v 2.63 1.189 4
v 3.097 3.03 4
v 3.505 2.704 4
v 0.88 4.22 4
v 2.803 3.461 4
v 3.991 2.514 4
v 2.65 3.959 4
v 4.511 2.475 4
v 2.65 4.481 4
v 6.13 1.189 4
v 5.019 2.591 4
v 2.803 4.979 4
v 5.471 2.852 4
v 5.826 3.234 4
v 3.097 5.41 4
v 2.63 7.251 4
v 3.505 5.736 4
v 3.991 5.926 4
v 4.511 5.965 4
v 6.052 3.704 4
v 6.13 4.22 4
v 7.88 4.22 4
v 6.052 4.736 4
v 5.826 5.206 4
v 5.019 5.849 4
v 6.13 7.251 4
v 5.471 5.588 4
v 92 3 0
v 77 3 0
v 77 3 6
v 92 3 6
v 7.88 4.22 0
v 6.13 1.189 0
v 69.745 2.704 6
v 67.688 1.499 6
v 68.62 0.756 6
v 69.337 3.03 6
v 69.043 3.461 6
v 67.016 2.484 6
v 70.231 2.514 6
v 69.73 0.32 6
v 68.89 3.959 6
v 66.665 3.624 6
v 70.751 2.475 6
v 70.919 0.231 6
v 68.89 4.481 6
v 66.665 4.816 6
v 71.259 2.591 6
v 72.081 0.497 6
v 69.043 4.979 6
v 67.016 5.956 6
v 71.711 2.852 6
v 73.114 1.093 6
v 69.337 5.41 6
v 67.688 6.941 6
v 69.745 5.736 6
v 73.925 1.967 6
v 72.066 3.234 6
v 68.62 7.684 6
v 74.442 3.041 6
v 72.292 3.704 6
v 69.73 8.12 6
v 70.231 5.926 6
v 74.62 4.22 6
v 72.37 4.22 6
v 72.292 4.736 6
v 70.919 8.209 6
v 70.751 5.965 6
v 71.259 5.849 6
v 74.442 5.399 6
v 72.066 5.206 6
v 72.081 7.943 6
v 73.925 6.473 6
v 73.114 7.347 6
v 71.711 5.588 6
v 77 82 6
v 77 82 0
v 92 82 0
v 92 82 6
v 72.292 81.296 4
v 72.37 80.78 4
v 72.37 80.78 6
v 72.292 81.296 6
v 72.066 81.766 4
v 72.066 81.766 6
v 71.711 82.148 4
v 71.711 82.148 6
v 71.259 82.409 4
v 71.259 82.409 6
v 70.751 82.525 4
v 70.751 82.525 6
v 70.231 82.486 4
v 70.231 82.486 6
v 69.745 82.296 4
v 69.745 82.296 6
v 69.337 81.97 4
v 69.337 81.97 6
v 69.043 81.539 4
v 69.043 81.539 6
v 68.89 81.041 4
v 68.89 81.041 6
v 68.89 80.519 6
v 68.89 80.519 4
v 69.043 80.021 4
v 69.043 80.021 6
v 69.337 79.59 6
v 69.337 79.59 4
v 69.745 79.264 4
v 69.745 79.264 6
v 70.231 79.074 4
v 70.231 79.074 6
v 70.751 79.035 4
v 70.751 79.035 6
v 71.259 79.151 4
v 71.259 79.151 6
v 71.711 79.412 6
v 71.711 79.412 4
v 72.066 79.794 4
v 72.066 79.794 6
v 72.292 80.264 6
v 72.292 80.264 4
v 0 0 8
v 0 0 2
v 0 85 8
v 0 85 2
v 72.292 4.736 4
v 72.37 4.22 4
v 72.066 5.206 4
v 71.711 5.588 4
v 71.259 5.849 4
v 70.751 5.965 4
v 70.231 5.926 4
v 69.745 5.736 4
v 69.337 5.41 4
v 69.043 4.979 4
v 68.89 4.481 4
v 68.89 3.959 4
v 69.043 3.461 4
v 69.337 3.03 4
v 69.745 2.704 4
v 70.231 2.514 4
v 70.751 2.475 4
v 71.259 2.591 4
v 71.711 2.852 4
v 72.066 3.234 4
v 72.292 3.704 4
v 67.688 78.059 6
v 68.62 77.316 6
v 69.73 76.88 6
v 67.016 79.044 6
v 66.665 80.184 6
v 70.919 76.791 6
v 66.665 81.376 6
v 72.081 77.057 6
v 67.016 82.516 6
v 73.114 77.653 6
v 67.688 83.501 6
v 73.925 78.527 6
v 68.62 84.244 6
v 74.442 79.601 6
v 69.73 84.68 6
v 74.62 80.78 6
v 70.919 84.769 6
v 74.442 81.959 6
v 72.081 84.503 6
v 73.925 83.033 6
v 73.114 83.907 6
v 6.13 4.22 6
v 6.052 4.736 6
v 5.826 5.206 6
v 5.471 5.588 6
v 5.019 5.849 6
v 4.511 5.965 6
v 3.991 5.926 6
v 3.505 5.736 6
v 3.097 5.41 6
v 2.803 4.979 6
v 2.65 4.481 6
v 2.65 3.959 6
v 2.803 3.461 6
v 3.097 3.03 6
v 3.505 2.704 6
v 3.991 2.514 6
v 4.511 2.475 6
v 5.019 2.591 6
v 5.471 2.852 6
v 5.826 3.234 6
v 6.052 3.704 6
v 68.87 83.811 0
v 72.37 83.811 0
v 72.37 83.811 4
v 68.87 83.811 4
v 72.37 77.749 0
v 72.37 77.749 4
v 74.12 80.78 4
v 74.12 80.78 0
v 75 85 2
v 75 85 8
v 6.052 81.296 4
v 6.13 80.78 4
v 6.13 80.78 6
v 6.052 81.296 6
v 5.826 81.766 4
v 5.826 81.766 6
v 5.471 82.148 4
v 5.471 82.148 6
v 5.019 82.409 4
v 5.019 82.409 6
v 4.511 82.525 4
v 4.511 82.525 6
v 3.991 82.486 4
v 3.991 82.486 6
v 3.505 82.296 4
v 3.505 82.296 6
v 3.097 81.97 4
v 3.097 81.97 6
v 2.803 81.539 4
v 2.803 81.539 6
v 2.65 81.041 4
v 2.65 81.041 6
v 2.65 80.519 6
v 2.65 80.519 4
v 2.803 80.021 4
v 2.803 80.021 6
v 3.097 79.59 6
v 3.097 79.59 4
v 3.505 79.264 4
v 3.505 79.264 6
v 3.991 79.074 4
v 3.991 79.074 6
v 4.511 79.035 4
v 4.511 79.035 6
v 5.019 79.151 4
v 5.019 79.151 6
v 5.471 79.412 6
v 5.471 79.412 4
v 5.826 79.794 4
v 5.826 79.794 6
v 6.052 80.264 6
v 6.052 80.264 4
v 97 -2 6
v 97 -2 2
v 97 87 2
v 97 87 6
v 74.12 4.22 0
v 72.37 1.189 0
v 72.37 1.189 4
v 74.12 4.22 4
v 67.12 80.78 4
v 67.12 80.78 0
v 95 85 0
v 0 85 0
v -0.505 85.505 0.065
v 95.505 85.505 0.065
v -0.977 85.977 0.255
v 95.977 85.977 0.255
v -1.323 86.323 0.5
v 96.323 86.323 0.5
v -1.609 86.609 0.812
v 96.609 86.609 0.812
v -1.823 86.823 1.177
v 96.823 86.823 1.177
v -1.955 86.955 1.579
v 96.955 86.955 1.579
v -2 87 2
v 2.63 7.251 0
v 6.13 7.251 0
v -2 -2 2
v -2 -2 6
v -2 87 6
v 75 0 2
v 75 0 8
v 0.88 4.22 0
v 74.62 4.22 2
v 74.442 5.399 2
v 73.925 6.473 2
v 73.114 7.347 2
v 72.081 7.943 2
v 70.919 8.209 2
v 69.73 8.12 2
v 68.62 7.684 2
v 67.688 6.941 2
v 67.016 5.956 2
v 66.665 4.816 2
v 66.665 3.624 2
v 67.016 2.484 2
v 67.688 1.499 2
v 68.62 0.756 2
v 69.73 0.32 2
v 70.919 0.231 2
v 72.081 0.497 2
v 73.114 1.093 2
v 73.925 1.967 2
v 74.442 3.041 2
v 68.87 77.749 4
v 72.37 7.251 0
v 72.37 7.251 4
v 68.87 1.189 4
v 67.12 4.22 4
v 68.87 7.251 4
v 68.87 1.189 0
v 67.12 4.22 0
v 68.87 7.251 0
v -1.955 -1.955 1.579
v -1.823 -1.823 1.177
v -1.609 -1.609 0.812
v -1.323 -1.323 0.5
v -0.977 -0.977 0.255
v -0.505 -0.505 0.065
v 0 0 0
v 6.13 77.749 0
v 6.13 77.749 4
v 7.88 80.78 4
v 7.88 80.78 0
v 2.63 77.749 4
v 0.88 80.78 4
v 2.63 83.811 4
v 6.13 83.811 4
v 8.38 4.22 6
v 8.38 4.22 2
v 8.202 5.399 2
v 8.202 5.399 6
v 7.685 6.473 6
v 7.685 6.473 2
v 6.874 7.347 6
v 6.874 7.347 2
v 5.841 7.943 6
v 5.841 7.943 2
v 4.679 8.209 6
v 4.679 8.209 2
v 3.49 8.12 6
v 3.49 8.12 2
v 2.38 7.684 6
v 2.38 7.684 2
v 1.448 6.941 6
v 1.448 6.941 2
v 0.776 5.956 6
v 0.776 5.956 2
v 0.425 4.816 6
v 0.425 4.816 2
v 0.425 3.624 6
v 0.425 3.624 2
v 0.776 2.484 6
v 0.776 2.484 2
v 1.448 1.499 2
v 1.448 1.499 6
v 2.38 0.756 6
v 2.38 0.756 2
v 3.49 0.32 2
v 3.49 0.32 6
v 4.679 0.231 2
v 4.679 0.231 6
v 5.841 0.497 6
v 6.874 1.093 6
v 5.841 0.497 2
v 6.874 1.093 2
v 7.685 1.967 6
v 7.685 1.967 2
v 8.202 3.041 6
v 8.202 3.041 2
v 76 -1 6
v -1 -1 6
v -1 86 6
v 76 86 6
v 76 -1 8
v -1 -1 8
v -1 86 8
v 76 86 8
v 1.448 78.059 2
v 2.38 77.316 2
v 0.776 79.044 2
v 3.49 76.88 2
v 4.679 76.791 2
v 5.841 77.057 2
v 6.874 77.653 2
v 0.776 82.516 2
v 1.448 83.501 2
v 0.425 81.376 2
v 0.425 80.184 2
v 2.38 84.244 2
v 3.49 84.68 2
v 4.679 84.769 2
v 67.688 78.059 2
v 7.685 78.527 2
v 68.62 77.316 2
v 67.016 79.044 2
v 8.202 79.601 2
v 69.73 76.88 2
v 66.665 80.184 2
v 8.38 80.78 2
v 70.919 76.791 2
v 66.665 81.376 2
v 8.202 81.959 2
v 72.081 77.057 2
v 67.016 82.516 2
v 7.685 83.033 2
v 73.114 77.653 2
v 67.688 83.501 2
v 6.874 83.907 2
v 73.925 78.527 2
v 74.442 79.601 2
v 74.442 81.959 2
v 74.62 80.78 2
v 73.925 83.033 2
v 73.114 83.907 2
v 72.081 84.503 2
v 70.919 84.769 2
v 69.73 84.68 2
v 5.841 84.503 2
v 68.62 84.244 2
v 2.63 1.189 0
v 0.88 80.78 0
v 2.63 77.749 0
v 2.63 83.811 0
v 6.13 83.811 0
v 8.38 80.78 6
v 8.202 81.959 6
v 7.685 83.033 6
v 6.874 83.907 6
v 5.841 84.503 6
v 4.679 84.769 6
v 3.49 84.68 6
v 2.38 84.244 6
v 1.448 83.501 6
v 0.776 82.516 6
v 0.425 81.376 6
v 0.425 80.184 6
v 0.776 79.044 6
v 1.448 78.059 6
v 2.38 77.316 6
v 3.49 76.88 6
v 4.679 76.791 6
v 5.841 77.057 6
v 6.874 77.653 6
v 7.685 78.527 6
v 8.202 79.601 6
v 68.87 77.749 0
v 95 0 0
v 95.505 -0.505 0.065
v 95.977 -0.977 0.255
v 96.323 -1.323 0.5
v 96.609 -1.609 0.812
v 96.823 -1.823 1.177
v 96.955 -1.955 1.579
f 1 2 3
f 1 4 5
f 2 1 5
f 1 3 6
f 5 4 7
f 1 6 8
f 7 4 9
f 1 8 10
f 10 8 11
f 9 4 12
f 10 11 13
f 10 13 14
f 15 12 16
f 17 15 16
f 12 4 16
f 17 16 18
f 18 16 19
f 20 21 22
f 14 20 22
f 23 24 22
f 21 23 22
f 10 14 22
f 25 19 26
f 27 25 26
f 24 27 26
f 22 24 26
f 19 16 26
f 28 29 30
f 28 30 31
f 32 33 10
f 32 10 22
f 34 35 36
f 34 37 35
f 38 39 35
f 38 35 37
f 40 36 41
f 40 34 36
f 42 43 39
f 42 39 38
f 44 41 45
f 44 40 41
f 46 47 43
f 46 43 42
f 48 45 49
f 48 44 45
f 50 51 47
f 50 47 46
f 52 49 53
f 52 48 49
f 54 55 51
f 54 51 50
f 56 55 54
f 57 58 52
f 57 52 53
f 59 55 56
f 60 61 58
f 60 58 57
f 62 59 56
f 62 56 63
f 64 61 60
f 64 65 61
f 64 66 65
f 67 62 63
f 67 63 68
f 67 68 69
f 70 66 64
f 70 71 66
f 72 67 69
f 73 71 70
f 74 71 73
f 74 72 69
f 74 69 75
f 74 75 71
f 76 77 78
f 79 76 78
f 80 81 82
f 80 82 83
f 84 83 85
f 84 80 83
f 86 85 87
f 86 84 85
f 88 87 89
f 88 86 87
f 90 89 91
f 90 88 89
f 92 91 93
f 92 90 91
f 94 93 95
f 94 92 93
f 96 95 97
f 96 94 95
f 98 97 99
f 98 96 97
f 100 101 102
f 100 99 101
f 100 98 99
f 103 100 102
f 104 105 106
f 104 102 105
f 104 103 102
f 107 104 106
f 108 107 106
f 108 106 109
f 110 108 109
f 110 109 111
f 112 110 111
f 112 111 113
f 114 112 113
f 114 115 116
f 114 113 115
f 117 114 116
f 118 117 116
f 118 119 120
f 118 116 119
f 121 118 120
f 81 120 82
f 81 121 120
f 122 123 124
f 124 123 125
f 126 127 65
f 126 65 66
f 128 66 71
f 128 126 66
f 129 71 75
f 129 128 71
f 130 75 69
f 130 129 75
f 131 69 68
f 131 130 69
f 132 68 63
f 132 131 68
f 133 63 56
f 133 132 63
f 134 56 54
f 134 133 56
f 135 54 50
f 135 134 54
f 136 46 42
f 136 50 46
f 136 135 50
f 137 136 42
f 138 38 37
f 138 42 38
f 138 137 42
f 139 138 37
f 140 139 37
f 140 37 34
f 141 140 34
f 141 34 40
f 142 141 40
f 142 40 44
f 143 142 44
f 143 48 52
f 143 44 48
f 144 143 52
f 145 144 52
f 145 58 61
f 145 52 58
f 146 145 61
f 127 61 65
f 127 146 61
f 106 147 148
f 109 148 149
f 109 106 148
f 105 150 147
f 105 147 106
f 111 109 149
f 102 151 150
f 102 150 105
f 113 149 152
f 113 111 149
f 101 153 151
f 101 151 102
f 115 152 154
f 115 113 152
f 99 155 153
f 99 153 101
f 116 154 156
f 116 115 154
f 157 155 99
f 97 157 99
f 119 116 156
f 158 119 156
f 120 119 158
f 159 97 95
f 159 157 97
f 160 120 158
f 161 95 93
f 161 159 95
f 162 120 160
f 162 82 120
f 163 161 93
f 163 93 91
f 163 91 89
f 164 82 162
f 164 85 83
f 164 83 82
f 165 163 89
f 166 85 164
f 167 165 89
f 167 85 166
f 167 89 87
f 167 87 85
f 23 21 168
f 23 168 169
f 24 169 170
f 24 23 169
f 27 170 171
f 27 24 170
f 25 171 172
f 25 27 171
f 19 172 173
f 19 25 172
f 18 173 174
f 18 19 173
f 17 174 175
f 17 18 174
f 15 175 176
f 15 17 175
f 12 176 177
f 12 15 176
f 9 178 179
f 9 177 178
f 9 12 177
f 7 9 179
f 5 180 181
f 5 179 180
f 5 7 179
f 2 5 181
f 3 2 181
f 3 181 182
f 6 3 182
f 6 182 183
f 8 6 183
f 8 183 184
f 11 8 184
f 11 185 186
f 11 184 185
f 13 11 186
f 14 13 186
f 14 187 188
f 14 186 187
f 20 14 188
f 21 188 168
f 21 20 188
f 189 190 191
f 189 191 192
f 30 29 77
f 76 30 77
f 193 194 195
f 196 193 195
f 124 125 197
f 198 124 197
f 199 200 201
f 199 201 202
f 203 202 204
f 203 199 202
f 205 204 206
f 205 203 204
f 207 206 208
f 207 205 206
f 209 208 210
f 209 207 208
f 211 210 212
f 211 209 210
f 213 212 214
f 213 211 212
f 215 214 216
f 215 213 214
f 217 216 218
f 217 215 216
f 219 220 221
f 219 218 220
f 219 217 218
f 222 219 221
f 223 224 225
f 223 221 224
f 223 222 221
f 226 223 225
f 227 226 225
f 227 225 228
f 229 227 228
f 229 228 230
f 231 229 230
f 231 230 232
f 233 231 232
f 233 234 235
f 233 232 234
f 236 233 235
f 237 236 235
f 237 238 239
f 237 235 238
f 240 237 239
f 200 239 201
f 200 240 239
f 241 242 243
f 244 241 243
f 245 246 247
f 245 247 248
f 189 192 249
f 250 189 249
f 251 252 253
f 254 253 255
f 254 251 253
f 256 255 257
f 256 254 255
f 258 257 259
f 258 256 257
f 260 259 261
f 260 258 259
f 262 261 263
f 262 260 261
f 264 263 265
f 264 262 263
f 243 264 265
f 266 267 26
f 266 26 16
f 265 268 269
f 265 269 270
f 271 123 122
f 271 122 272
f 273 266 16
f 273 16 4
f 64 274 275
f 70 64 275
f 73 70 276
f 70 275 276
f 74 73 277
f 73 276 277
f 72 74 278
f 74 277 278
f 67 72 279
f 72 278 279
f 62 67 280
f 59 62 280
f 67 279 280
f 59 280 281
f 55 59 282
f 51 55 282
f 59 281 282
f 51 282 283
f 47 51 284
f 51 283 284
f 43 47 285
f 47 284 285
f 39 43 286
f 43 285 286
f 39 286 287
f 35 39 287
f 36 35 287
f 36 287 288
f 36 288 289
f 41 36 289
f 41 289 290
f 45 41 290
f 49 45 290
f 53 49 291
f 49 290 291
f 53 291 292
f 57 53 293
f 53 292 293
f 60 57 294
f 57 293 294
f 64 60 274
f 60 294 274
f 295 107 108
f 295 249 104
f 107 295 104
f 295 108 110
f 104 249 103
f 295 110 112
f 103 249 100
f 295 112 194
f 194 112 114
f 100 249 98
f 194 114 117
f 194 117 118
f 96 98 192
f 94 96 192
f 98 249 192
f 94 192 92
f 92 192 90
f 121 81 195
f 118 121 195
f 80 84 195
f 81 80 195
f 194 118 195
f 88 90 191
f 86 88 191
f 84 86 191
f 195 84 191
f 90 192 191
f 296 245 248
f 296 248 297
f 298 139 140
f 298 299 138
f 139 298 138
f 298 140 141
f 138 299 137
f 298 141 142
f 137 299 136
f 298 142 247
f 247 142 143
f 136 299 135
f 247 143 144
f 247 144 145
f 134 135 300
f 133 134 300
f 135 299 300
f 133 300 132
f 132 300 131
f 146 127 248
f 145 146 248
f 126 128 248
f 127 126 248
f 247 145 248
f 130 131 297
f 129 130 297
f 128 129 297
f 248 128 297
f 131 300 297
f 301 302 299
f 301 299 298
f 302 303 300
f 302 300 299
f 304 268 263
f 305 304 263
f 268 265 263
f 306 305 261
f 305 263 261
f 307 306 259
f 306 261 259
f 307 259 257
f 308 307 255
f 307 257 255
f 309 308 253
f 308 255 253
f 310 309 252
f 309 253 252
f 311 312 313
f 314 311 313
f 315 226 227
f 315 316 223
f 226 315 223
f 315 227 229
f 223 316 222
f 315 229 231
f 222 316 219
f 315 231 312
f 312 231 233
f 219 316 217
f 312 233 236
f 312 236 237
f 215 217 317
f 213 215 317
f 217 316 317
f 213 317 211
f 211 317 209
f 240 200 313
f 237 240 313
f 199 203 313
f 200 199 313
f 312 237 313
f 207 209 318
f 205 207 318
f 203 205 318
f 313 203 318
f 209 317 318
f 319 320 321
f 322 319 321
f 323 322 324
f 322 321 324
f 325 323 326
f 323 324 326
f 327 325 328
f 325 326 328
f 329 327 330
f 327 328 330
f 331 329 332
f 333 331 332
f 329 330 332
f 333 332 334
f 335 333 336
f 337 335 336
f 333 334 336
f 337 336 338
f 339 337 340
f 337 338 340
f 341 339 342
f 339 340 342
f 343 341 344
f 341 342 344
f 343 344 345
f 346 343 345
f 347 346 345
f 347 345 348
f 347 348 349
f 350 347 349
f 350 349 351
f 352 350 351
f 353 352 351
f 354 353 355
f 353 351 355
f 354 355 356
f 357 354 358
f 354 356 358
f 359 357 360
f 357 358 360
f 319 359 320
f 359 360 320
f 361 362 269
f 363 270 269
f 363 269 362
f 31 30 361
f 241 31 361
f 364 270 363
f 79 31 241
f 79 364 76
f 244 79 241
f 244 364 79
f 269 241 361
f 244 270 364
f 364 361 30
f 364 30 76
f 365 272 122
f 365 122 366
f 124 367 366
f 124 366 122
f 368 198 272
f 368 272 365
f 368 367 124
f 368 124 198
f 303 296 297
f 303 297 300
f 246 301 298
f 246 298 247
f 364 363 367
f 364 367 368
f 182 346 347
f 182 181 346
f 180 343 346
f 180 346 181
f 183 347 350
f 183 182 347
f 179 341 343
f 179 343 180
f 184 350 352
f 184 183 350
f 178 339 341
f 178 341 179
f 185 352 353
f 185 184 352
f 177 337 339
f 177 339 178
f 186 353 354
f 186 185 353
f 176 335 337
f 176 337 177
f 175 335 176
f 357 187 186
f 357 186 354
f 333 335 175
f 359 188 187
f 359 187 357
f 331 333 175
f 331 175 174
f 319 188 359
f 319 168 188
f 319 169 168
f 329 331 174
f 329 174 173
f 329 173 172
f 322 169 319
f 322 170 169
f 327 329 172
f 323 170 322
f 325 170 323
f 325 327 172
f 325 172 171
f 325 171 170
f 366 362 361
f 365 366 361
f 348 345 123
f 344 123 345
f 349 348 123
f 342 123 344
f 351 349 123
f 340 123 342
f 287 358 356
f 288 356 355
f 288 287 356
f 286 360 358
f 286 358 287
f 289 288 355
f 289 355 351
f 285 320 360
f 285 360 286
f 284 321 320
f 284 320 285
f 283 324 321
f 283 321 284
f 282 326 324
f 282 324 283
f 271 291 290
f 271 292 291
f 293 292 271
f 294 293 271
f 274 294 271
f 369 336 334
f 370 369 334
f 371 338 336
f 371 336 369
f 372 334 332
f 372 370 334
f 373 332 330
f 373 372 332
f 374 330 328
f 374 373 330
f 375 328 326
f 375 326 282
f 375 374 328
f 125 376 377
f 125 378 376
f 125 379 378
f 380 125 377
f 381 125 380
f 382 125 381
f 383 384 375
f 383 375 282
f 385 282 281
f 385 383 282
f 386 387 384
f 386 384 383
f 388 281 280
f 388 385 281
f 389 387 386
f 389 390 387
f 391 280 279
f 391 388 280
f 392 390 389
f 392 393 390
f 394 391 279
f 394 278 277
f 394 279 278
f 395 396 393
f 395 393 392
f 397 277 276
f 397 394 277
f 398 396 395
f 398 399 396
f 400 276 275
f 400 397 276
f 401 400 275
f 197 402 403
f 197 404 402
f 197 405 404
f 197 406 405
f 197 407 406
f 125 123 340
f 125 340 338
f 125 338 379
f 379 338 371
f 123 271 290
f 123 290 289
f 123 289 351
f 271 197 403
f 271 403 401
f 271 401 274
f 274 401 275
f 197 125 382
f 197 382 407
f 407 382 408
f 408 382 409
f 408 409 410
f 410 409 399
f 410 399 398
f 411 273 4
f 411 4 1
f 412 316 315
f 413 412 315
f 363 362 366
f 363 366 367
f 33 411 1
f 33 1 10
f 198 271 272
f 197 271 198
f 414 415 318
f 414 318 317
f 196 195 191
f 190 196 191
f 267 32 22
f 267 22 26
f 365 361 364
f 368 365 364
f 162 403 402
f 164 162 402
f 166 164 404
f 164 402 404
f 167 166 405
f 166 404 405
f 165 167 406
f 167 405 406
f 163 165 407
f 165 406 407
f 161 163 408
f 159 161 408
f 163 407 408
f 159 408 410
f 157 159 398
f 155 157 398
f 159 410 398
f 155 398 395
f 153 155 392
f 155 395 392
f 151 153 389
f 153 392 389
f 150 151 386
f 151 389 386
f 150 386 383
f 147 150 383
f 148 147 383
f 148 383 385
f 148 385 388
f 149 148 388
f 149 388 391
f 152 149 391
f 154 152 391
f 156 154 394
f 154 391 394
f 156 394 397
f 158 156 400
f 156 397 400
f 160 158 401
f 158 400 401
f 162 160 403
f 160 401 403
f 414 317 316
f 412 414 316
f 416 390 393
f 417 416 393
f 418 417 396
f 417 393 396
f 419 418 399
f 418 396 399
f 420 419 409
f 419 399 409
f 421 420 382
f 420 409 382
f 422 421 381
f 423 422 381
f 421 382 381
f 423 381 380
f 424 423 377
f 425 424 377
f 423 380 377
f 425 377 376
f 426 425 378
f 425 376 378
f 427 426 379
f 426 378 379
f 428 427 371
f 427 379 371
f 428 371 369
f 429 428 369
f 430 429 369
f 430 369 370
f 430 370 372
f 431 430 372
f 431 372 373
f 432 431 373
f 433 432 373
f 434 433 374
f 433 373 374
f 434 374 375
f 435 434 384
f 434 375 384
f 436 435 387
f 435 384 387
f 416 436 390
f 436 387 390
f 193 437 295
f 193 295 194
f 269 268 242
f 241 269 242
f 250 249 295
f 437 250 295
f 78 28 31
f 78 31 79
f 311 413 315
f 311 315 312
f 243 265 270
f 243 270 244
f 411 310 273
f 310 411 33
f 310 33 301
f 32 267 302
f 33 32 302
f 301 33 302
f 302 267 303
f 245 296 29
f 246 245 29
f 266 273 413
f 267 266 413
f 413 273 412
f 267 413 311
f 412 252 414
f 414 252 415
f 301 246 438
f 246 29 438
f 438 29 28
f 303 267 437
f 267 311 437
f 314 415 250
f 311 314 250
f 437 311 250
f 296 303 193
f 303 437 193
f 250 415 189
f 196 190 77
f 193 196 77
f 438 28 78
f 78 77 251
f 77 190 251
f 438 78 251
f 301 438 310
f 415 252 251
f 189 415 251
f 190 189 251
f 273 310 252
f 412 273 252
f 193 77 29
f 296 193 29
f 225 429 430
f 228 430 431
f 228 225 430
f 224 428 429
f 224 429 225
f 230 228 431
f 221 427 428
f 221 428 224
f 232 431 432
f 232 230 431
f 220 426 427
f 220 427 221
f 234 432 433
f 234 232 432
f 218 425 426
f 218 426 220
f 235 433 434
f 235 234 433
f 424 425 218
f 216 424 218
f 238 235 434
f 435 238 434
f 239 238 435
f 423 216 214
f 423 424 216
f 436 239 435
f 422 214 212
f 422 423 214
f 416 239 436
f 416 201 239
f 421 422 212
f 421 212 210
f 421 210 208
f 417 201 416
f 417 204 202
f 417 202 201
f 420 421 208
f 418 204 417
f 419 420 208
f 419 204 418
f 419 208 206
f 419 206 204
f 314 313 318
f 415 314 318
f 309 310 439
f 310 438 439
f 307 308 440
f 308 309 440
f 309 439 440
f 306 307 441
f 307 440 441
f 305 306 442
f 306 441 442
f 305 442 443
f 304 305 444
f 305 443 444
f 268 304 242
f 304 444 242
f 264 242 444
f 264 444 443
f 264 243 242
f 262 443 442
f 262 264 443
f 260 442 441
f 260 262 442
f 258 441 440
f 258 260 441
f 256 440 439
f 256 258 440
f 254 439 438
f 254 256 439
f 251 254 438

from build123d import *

# Parameters (mm, degrees)
BOX003_W          = 77
BOX003_H          = 87
BOX003_DEPTH      = 10
BOX002_W          = 79
BOX002_H          = 89
BOX002_DEPTH      = 10
CYLINDER005_R     = 1.75
CYLINDER005_DEPTH = 10
CYLINDER006_R     = 1.75
CYLINDER006_DEPTH = 10
CYLINDER007_R     = 1.75
CYLINDER007_DEPTH = 10
CYLINDER008_R     = 1.75
CYLINDER008_DEPTH = 10
PRISM_DEPTH       = 4
PRISM001_DEPTH    = 4
PRISM002_DEPTH    = 4
PRISM003_DEPTH    = 4
CYLINDER_R        = 1.75
CYLINDER_DEPTH    = 10
CYLINDER001_R     = 1.75
CYLINDER001_DEPTH = 10
CYLINDER002_R     = 1.75
CYLINDER002_DEPTH = 10
CYLINDER003_R     = 1.75
CYLINDER003_DEPTH = 10
BOX_W             = 75
BOX_H             = 85
BOX_DEPTH         = 10
BOX001_W          = 79
BOX001_H          = 89
BOX001_DEPTH      = 8
CYLINDER011_R     = 4
CYLINDER011_DEPTH = 4
CYLINDER010_R     = 4
CYLINDER010_DEPTH = 4
CYLINDER009_R     = 4
CYLINDER009_DEPTH = 4
CYLINDER004_R     = 4
CYLINDER004_DEPTH = 4
FILLET001_R       = 2
BOX005_W          = 15
BOX005_H          = 5
BOX005_DEPTH      = 6
BOX006_W          = 5
BOX006_H          = 89
BOX006_DEPTH      = 6
BOX004_W          = 15
BOX004_H          = 5
BOX004_DEPTH      = 6
FILLET_R          = 2


with BuildPart() as cube003:
    # Box003 → Box003 (new body)
    with BuildSketch(Plane(origin=(-1, -1, 10), x_dir=(1, 0, 0), z_dir=(0, 0, 1))):
        with Locations((38.5, 43.5)):
            Rectangle(BOX003_W, BOX003_H)
    extrude(amount=BOX003_DEPTH)


with BuildPart() as cut013:
    # Box002 → Box002 (new body)
    with BuildSketch(Plane(origin=(-2, -2, 10), x_dir=(1, 0, 0), z_dir=(0, 0, 1))):
        with Locations((39.5, 44.5)):
            Rectangle(BOX002_W, BOX002_H)
    extrude(amount=BOX002_DEPTH)

    # Cut013: cut Cube003
    add(cube003.part, mode=Mode.SUBTRACT)


with BuildPart() as cut013_1:
    # Cut013 placement: moved
    add(cut013.part.moved(Location((0, 0, -4))))


with BuildPart() as cylinder005:
    # Cylinder005 → Cylinder005 (new body)
    with BuildSketch(Plane(origin=(4.38, 4.22, -1), x_dir=(1, 0, 0), z_dir=(0, 0, 1))):
        Circle(CYLINDER005_R)
    extrude(amount=CYLINDER005_DEPTH)


with BuildPart() as cylinder006:
    # Cylinder006 → Cylinder006 (new body)
    with BuildSketch(Plane(origin=(70.62, 4.22, -1), x_dir=(1, 0, 0), z_dir=(0, 0, 1))):
        Circle(CYLINDER006_R)
    extrude(amount=CYLINDER006_DEPTH)


with BuildPart() as cylinder007:
    # Cylinder007 → Cylinder007 (new body)
    with BuildSketch(Plane(origin=(70.62, 80.78, -1), x_dir=(1, 0, 0), z_dir=(0, 0, 1))):
        Circle(CYLINDER007_R)
    extrude(amount=CYLINDER007_DEPTH)


with BuildPart() as cylinder008:
    # Cylinder008 → Cylinder008 (new body)
    with BuildSketch(Plane(origin=(4.38, 80.78, -1), x_dir=(1, 0, 0), z_dir=(0, 0, 1))):
        Circle(CYLINDER008_R)
    extrude(amount=CYLINDER008_DEPTH)


with BuildPart() as prism:
    # Prism → Prism (new body)
    with BuildSketch(Plane(origin=(4.38, 4.22, 0), x_dir=(1, 0, 0), z_dir=(0, 0, 1))):
        Polygon((3.5, 0), (1.75, 3.031089), (-1.75, 3.031089), (-3.5, 0), (-1.75, -3.031089), (1.75, -3.031089), align=None)
    extrude(amount=PRISM_DEPTH)


with BuildPart() as prism001:
    # Prism001 → Prism001 (new body)
    with BuildSketch(Plane(origin=(70.62, 4.22, 0), x_dir=(1, 0, 0), z_dir=(0, 0, 1))):
        Polygon((3.5, 0), (1.75, 3.031089), (-1.75, 3.031089), (-3.5, 0), (-1.75, -3.031089), (1.75, -3.031089), align=None)
    extrude(amount=PRISM001_DEPTH)


with BuildPart() as prism002:
    # Prism002 → Prism002 (new body)
    with BuildSketch(Plane(origin=(70.62, 80.78, 0), x_dir=(1, 0, 0), z_dir=(0, 0, 1))):
        Polygon((3.5, 0), (1.75, 3.031089), (-1.75, 3.031089), (-3.5, 0), (-1.75, -3.031089), (1.75, -3.031089), align=None)
    extrude(amount=PRISM002_DEPTH)


with BuildPart() as prism003:
    # Prism003 → Prism003 (new body)
    with BuildSketch(Plane(origin=(4.38, 80.78, 0), x_dir=(1, 0, 0), z_dir=(0, 0, 1))):
        Polygon((3.5, 0), (1.75, 3.031089), (-1.75, 3.031089), (-3.5, 0), (-1.75, -3.031089), (1.75, -3.031089), align=None)
    extrude(amount=PRISM003_DEPTH)


with BuildPart() as cylinder:
    # Cylinder → Cylinder (new body)
    with BuildSketch(Plane(origin=(4.38, 80.78, 0), x_dir=(1, 0, 0), z_dir=(0, 0, 1))):
        Circle(CYLINDER_R)
    extrude(amount=CYLINDER_DEPTH)


with BuildPart() as cylinder001:
    # Cylinder001 → Cylinder001 (new body)
    with BuildSketch(Plane(origin=(70.62, 80.78, 0), x_dir=(1, 0, 0), z_dir=(0, 0, 1))):
        Circle(CYLINDER001_R)
    extrude(amount=CYLINDER001_DEPTH)


with BuildPart() as cylinder002:
    # Cylinder002 → Cylinder002 (new body)
    with BuildSketch(Plane(origin=(70.62, 4.22, 0), x_dir=(1, 0, 0), z_dir=(0, 0, 1))):
        Circle(CYLINDER002_R)
    extrude(amount=CYLINDER002_DEPTH)


with BuildPart() as cylinder003:
    # Cylinder003 → Cylinder003 (new body)
    with BuildSketch(Plane(origin=(4.38, 4.22, 0), x_dir=(1, 0, 0), z_dir=(0, 0, 1))):
        Circle(CYLINDER003_R)
    extrude(amount=CYLINDER003_DEPTH)


with BuildPart() as cube:
    # Box → Box (new body)
    with BuildSketch(Plane.XY.offset(2)):
        with Locations((37.5, 42.5)):
            Rectangle(BOX_W, BOX_H)
    extrude(amount=BOX_DEPTH)


with BuildPart() as cut004:
    # Box001 → Box001 (new body)
    with BuildSketch(Plane(origin=(-2, -2, 0), x_dir=(1, 0, 0), z_dir=(0, 0, 1))):
        with Locations((39.5, 44.5)):
            Rectangle(BOX001_W, BOX001_H)
    extrude(amount=BOX001_DEPTH)

    # Cut: cut Cube
    add(cube.part, mode=Mode.SUBTRACT)

    # Cut001: cut Cylinder003
    add(cylinder003.part, mode=Mode.SUBTRACT)

    # Cut002: cut Cylinder002
    add(cylinder002.part, mode=Mode.SUBTRACT)

    # Cut003: cut Cylinder001
    add(cylinder001.part, mode=Mode.SUBTRACT)

    # Cut004: cut Cylinder
    add(cylinder.part, mode=Mode.SUBTRACT)


with BuildPart() as fusion:
    # Cylinder011 → Cylinder011 (new body)
    with BuildSketch(Plane(origin=(4.38, 80.78, 2), x_dir=(1, 0, 0), z_dir=(0, 0, 1))):
        Circle(CYLINDER011_R)
    extrude(amount=CYLINDER011_DEPTH)

    # Fusion: union Cut004
    add(cut004.part)


with BuildPart() as fusion001:
    # Cylinder010 → Cylinder010 (new body)
    with BuildSketch(Plane(origin=(70.62, 80.78, 2), x_dir=(1, 0, 0), z_dir=(0, 0, 1))):
        Circle(CYLINDER010_R)
    extrude(amount=CYLINDER010_DEPTH)

    # Fusion001: union Fusion
    add(fusion.part)


with BuildPart() as fusion002:
    # Cylinder009 → Cylinder009 (new body)
    with BuildSketch(Plane(origin=(70.62, 4.22, 2), x_dir=(1, 0, 0), z_dir=(0, 0, 1))):
        Circle(CYLINDER009_R)
    extrude(amount=CYLINDER009_DEPTH)

    # Fusion002: union Fusion001
    add(fusion001.part)


with BuildPart() as fillet001:
    # Cylinder004 → Cylinder004 (new body)
    with BuildSketch(Plane(origin=(4.38, 4.22, 2), x_dir=(1, 0, 0), z_dir=(0, 0, 1))):
        Circle(CYLINDER004_R)
    extrude(amount=CYLINDER004_DEPTH)

    # Fusion003: union Fusion002
    add(fusion002.part)

    # Cut005: cut Prism003
    add(prism003.part, mode=Mode.SUBTRACT)

    # Cut006: cut Prism002
    add(prism002.part, mode=Mode.SUBTRACT)

    # Cut007: cut Prism001
    add(prism001.part, mode=Mode.SUBTRACT)

    # Cut008: cut Prism
    add(prism.part, mode=Mode.SUBTRACT)

    # Cut009: cut Cylinder008
    add(cylinder008.part, mode=Mode.SUBTRACT)

    # Cut010: cut Cylinder007
    add(cylinder007.part, mode=Mode.SUBTRACT)

    # Cut011: cut Cylinder006
    add(cylinder006.part, mode=Mode.SUBTRACT)

    # Cut012: cut Cylinder005
    add(cylinder005.part, mode=Mode.SUBTRACT)

    # Cut014: cut Cut013
    add(cut013_1.part, mode=Mode.SUBTRACT)

    # Fillet001
    fillet001_edges = [fillet001.edges().sort_by_distance(p)[0] for p in [
        (-2, 42.5, 0),
        (37.5, 87, 0),
        (37.5, -2, 0),
    ]]
    fillet(fillet001_edges, radius=FILLET001_R)


with BuildPart() as cube005:
    # Box005 → Box005 (new body)
    with BuildSketch(Plane(origin=(77, 82, 0), x_dir=(1, 0, 0), z_dir=(0, 0, 1))):
        with Locations((7.5, 2.5)):
            Rectangle(BOX005_W, BOX005_H)
    extrude(amount=BOX005_DEPTH)


with BuildPart() as cube006:
    # Box006 → Box006 (new body)
    with BuildSketch(Plane(origin=(92, -2, 0), x_dir=(1, 0, 0), z_dir=(0, 0, 1))):
        with Locations((2.5, 44.5)):
            Rectangle(BOX006_W, BOX006_H)
    extrude(amount=BOX006_DEPTH)


with BuildPart() as fusion005:
    # Box004 → Box004 (new body)
    with BuildSketch(Plane(origin=(77, -2, 0), x_dir=(1, 0, 0), z_dir=(0, 0, 1))):
        with Locations((7.5, 2.5)):
            Rectangle(BOX004_W, BOX004_H)
    extrude(amount=BOX004_DEPTH)

    # Fusion004: union Cube005, Cube006
    add(cube005.part)
    add(cube006.part)

    # Fillet
    fillet_edges = [fusion005.edges().sort_by_distance(p)[0] for p in [
        (84.5, -2, 0),
        (97, 42.5, 0),
        (84.5, 87, 0),
    ]]
    fillet(fillet_edges, radius=FILLET_R)

    # Fusion005: union Fillet001
    add(fillet001.part)


solid = fusion005.part
